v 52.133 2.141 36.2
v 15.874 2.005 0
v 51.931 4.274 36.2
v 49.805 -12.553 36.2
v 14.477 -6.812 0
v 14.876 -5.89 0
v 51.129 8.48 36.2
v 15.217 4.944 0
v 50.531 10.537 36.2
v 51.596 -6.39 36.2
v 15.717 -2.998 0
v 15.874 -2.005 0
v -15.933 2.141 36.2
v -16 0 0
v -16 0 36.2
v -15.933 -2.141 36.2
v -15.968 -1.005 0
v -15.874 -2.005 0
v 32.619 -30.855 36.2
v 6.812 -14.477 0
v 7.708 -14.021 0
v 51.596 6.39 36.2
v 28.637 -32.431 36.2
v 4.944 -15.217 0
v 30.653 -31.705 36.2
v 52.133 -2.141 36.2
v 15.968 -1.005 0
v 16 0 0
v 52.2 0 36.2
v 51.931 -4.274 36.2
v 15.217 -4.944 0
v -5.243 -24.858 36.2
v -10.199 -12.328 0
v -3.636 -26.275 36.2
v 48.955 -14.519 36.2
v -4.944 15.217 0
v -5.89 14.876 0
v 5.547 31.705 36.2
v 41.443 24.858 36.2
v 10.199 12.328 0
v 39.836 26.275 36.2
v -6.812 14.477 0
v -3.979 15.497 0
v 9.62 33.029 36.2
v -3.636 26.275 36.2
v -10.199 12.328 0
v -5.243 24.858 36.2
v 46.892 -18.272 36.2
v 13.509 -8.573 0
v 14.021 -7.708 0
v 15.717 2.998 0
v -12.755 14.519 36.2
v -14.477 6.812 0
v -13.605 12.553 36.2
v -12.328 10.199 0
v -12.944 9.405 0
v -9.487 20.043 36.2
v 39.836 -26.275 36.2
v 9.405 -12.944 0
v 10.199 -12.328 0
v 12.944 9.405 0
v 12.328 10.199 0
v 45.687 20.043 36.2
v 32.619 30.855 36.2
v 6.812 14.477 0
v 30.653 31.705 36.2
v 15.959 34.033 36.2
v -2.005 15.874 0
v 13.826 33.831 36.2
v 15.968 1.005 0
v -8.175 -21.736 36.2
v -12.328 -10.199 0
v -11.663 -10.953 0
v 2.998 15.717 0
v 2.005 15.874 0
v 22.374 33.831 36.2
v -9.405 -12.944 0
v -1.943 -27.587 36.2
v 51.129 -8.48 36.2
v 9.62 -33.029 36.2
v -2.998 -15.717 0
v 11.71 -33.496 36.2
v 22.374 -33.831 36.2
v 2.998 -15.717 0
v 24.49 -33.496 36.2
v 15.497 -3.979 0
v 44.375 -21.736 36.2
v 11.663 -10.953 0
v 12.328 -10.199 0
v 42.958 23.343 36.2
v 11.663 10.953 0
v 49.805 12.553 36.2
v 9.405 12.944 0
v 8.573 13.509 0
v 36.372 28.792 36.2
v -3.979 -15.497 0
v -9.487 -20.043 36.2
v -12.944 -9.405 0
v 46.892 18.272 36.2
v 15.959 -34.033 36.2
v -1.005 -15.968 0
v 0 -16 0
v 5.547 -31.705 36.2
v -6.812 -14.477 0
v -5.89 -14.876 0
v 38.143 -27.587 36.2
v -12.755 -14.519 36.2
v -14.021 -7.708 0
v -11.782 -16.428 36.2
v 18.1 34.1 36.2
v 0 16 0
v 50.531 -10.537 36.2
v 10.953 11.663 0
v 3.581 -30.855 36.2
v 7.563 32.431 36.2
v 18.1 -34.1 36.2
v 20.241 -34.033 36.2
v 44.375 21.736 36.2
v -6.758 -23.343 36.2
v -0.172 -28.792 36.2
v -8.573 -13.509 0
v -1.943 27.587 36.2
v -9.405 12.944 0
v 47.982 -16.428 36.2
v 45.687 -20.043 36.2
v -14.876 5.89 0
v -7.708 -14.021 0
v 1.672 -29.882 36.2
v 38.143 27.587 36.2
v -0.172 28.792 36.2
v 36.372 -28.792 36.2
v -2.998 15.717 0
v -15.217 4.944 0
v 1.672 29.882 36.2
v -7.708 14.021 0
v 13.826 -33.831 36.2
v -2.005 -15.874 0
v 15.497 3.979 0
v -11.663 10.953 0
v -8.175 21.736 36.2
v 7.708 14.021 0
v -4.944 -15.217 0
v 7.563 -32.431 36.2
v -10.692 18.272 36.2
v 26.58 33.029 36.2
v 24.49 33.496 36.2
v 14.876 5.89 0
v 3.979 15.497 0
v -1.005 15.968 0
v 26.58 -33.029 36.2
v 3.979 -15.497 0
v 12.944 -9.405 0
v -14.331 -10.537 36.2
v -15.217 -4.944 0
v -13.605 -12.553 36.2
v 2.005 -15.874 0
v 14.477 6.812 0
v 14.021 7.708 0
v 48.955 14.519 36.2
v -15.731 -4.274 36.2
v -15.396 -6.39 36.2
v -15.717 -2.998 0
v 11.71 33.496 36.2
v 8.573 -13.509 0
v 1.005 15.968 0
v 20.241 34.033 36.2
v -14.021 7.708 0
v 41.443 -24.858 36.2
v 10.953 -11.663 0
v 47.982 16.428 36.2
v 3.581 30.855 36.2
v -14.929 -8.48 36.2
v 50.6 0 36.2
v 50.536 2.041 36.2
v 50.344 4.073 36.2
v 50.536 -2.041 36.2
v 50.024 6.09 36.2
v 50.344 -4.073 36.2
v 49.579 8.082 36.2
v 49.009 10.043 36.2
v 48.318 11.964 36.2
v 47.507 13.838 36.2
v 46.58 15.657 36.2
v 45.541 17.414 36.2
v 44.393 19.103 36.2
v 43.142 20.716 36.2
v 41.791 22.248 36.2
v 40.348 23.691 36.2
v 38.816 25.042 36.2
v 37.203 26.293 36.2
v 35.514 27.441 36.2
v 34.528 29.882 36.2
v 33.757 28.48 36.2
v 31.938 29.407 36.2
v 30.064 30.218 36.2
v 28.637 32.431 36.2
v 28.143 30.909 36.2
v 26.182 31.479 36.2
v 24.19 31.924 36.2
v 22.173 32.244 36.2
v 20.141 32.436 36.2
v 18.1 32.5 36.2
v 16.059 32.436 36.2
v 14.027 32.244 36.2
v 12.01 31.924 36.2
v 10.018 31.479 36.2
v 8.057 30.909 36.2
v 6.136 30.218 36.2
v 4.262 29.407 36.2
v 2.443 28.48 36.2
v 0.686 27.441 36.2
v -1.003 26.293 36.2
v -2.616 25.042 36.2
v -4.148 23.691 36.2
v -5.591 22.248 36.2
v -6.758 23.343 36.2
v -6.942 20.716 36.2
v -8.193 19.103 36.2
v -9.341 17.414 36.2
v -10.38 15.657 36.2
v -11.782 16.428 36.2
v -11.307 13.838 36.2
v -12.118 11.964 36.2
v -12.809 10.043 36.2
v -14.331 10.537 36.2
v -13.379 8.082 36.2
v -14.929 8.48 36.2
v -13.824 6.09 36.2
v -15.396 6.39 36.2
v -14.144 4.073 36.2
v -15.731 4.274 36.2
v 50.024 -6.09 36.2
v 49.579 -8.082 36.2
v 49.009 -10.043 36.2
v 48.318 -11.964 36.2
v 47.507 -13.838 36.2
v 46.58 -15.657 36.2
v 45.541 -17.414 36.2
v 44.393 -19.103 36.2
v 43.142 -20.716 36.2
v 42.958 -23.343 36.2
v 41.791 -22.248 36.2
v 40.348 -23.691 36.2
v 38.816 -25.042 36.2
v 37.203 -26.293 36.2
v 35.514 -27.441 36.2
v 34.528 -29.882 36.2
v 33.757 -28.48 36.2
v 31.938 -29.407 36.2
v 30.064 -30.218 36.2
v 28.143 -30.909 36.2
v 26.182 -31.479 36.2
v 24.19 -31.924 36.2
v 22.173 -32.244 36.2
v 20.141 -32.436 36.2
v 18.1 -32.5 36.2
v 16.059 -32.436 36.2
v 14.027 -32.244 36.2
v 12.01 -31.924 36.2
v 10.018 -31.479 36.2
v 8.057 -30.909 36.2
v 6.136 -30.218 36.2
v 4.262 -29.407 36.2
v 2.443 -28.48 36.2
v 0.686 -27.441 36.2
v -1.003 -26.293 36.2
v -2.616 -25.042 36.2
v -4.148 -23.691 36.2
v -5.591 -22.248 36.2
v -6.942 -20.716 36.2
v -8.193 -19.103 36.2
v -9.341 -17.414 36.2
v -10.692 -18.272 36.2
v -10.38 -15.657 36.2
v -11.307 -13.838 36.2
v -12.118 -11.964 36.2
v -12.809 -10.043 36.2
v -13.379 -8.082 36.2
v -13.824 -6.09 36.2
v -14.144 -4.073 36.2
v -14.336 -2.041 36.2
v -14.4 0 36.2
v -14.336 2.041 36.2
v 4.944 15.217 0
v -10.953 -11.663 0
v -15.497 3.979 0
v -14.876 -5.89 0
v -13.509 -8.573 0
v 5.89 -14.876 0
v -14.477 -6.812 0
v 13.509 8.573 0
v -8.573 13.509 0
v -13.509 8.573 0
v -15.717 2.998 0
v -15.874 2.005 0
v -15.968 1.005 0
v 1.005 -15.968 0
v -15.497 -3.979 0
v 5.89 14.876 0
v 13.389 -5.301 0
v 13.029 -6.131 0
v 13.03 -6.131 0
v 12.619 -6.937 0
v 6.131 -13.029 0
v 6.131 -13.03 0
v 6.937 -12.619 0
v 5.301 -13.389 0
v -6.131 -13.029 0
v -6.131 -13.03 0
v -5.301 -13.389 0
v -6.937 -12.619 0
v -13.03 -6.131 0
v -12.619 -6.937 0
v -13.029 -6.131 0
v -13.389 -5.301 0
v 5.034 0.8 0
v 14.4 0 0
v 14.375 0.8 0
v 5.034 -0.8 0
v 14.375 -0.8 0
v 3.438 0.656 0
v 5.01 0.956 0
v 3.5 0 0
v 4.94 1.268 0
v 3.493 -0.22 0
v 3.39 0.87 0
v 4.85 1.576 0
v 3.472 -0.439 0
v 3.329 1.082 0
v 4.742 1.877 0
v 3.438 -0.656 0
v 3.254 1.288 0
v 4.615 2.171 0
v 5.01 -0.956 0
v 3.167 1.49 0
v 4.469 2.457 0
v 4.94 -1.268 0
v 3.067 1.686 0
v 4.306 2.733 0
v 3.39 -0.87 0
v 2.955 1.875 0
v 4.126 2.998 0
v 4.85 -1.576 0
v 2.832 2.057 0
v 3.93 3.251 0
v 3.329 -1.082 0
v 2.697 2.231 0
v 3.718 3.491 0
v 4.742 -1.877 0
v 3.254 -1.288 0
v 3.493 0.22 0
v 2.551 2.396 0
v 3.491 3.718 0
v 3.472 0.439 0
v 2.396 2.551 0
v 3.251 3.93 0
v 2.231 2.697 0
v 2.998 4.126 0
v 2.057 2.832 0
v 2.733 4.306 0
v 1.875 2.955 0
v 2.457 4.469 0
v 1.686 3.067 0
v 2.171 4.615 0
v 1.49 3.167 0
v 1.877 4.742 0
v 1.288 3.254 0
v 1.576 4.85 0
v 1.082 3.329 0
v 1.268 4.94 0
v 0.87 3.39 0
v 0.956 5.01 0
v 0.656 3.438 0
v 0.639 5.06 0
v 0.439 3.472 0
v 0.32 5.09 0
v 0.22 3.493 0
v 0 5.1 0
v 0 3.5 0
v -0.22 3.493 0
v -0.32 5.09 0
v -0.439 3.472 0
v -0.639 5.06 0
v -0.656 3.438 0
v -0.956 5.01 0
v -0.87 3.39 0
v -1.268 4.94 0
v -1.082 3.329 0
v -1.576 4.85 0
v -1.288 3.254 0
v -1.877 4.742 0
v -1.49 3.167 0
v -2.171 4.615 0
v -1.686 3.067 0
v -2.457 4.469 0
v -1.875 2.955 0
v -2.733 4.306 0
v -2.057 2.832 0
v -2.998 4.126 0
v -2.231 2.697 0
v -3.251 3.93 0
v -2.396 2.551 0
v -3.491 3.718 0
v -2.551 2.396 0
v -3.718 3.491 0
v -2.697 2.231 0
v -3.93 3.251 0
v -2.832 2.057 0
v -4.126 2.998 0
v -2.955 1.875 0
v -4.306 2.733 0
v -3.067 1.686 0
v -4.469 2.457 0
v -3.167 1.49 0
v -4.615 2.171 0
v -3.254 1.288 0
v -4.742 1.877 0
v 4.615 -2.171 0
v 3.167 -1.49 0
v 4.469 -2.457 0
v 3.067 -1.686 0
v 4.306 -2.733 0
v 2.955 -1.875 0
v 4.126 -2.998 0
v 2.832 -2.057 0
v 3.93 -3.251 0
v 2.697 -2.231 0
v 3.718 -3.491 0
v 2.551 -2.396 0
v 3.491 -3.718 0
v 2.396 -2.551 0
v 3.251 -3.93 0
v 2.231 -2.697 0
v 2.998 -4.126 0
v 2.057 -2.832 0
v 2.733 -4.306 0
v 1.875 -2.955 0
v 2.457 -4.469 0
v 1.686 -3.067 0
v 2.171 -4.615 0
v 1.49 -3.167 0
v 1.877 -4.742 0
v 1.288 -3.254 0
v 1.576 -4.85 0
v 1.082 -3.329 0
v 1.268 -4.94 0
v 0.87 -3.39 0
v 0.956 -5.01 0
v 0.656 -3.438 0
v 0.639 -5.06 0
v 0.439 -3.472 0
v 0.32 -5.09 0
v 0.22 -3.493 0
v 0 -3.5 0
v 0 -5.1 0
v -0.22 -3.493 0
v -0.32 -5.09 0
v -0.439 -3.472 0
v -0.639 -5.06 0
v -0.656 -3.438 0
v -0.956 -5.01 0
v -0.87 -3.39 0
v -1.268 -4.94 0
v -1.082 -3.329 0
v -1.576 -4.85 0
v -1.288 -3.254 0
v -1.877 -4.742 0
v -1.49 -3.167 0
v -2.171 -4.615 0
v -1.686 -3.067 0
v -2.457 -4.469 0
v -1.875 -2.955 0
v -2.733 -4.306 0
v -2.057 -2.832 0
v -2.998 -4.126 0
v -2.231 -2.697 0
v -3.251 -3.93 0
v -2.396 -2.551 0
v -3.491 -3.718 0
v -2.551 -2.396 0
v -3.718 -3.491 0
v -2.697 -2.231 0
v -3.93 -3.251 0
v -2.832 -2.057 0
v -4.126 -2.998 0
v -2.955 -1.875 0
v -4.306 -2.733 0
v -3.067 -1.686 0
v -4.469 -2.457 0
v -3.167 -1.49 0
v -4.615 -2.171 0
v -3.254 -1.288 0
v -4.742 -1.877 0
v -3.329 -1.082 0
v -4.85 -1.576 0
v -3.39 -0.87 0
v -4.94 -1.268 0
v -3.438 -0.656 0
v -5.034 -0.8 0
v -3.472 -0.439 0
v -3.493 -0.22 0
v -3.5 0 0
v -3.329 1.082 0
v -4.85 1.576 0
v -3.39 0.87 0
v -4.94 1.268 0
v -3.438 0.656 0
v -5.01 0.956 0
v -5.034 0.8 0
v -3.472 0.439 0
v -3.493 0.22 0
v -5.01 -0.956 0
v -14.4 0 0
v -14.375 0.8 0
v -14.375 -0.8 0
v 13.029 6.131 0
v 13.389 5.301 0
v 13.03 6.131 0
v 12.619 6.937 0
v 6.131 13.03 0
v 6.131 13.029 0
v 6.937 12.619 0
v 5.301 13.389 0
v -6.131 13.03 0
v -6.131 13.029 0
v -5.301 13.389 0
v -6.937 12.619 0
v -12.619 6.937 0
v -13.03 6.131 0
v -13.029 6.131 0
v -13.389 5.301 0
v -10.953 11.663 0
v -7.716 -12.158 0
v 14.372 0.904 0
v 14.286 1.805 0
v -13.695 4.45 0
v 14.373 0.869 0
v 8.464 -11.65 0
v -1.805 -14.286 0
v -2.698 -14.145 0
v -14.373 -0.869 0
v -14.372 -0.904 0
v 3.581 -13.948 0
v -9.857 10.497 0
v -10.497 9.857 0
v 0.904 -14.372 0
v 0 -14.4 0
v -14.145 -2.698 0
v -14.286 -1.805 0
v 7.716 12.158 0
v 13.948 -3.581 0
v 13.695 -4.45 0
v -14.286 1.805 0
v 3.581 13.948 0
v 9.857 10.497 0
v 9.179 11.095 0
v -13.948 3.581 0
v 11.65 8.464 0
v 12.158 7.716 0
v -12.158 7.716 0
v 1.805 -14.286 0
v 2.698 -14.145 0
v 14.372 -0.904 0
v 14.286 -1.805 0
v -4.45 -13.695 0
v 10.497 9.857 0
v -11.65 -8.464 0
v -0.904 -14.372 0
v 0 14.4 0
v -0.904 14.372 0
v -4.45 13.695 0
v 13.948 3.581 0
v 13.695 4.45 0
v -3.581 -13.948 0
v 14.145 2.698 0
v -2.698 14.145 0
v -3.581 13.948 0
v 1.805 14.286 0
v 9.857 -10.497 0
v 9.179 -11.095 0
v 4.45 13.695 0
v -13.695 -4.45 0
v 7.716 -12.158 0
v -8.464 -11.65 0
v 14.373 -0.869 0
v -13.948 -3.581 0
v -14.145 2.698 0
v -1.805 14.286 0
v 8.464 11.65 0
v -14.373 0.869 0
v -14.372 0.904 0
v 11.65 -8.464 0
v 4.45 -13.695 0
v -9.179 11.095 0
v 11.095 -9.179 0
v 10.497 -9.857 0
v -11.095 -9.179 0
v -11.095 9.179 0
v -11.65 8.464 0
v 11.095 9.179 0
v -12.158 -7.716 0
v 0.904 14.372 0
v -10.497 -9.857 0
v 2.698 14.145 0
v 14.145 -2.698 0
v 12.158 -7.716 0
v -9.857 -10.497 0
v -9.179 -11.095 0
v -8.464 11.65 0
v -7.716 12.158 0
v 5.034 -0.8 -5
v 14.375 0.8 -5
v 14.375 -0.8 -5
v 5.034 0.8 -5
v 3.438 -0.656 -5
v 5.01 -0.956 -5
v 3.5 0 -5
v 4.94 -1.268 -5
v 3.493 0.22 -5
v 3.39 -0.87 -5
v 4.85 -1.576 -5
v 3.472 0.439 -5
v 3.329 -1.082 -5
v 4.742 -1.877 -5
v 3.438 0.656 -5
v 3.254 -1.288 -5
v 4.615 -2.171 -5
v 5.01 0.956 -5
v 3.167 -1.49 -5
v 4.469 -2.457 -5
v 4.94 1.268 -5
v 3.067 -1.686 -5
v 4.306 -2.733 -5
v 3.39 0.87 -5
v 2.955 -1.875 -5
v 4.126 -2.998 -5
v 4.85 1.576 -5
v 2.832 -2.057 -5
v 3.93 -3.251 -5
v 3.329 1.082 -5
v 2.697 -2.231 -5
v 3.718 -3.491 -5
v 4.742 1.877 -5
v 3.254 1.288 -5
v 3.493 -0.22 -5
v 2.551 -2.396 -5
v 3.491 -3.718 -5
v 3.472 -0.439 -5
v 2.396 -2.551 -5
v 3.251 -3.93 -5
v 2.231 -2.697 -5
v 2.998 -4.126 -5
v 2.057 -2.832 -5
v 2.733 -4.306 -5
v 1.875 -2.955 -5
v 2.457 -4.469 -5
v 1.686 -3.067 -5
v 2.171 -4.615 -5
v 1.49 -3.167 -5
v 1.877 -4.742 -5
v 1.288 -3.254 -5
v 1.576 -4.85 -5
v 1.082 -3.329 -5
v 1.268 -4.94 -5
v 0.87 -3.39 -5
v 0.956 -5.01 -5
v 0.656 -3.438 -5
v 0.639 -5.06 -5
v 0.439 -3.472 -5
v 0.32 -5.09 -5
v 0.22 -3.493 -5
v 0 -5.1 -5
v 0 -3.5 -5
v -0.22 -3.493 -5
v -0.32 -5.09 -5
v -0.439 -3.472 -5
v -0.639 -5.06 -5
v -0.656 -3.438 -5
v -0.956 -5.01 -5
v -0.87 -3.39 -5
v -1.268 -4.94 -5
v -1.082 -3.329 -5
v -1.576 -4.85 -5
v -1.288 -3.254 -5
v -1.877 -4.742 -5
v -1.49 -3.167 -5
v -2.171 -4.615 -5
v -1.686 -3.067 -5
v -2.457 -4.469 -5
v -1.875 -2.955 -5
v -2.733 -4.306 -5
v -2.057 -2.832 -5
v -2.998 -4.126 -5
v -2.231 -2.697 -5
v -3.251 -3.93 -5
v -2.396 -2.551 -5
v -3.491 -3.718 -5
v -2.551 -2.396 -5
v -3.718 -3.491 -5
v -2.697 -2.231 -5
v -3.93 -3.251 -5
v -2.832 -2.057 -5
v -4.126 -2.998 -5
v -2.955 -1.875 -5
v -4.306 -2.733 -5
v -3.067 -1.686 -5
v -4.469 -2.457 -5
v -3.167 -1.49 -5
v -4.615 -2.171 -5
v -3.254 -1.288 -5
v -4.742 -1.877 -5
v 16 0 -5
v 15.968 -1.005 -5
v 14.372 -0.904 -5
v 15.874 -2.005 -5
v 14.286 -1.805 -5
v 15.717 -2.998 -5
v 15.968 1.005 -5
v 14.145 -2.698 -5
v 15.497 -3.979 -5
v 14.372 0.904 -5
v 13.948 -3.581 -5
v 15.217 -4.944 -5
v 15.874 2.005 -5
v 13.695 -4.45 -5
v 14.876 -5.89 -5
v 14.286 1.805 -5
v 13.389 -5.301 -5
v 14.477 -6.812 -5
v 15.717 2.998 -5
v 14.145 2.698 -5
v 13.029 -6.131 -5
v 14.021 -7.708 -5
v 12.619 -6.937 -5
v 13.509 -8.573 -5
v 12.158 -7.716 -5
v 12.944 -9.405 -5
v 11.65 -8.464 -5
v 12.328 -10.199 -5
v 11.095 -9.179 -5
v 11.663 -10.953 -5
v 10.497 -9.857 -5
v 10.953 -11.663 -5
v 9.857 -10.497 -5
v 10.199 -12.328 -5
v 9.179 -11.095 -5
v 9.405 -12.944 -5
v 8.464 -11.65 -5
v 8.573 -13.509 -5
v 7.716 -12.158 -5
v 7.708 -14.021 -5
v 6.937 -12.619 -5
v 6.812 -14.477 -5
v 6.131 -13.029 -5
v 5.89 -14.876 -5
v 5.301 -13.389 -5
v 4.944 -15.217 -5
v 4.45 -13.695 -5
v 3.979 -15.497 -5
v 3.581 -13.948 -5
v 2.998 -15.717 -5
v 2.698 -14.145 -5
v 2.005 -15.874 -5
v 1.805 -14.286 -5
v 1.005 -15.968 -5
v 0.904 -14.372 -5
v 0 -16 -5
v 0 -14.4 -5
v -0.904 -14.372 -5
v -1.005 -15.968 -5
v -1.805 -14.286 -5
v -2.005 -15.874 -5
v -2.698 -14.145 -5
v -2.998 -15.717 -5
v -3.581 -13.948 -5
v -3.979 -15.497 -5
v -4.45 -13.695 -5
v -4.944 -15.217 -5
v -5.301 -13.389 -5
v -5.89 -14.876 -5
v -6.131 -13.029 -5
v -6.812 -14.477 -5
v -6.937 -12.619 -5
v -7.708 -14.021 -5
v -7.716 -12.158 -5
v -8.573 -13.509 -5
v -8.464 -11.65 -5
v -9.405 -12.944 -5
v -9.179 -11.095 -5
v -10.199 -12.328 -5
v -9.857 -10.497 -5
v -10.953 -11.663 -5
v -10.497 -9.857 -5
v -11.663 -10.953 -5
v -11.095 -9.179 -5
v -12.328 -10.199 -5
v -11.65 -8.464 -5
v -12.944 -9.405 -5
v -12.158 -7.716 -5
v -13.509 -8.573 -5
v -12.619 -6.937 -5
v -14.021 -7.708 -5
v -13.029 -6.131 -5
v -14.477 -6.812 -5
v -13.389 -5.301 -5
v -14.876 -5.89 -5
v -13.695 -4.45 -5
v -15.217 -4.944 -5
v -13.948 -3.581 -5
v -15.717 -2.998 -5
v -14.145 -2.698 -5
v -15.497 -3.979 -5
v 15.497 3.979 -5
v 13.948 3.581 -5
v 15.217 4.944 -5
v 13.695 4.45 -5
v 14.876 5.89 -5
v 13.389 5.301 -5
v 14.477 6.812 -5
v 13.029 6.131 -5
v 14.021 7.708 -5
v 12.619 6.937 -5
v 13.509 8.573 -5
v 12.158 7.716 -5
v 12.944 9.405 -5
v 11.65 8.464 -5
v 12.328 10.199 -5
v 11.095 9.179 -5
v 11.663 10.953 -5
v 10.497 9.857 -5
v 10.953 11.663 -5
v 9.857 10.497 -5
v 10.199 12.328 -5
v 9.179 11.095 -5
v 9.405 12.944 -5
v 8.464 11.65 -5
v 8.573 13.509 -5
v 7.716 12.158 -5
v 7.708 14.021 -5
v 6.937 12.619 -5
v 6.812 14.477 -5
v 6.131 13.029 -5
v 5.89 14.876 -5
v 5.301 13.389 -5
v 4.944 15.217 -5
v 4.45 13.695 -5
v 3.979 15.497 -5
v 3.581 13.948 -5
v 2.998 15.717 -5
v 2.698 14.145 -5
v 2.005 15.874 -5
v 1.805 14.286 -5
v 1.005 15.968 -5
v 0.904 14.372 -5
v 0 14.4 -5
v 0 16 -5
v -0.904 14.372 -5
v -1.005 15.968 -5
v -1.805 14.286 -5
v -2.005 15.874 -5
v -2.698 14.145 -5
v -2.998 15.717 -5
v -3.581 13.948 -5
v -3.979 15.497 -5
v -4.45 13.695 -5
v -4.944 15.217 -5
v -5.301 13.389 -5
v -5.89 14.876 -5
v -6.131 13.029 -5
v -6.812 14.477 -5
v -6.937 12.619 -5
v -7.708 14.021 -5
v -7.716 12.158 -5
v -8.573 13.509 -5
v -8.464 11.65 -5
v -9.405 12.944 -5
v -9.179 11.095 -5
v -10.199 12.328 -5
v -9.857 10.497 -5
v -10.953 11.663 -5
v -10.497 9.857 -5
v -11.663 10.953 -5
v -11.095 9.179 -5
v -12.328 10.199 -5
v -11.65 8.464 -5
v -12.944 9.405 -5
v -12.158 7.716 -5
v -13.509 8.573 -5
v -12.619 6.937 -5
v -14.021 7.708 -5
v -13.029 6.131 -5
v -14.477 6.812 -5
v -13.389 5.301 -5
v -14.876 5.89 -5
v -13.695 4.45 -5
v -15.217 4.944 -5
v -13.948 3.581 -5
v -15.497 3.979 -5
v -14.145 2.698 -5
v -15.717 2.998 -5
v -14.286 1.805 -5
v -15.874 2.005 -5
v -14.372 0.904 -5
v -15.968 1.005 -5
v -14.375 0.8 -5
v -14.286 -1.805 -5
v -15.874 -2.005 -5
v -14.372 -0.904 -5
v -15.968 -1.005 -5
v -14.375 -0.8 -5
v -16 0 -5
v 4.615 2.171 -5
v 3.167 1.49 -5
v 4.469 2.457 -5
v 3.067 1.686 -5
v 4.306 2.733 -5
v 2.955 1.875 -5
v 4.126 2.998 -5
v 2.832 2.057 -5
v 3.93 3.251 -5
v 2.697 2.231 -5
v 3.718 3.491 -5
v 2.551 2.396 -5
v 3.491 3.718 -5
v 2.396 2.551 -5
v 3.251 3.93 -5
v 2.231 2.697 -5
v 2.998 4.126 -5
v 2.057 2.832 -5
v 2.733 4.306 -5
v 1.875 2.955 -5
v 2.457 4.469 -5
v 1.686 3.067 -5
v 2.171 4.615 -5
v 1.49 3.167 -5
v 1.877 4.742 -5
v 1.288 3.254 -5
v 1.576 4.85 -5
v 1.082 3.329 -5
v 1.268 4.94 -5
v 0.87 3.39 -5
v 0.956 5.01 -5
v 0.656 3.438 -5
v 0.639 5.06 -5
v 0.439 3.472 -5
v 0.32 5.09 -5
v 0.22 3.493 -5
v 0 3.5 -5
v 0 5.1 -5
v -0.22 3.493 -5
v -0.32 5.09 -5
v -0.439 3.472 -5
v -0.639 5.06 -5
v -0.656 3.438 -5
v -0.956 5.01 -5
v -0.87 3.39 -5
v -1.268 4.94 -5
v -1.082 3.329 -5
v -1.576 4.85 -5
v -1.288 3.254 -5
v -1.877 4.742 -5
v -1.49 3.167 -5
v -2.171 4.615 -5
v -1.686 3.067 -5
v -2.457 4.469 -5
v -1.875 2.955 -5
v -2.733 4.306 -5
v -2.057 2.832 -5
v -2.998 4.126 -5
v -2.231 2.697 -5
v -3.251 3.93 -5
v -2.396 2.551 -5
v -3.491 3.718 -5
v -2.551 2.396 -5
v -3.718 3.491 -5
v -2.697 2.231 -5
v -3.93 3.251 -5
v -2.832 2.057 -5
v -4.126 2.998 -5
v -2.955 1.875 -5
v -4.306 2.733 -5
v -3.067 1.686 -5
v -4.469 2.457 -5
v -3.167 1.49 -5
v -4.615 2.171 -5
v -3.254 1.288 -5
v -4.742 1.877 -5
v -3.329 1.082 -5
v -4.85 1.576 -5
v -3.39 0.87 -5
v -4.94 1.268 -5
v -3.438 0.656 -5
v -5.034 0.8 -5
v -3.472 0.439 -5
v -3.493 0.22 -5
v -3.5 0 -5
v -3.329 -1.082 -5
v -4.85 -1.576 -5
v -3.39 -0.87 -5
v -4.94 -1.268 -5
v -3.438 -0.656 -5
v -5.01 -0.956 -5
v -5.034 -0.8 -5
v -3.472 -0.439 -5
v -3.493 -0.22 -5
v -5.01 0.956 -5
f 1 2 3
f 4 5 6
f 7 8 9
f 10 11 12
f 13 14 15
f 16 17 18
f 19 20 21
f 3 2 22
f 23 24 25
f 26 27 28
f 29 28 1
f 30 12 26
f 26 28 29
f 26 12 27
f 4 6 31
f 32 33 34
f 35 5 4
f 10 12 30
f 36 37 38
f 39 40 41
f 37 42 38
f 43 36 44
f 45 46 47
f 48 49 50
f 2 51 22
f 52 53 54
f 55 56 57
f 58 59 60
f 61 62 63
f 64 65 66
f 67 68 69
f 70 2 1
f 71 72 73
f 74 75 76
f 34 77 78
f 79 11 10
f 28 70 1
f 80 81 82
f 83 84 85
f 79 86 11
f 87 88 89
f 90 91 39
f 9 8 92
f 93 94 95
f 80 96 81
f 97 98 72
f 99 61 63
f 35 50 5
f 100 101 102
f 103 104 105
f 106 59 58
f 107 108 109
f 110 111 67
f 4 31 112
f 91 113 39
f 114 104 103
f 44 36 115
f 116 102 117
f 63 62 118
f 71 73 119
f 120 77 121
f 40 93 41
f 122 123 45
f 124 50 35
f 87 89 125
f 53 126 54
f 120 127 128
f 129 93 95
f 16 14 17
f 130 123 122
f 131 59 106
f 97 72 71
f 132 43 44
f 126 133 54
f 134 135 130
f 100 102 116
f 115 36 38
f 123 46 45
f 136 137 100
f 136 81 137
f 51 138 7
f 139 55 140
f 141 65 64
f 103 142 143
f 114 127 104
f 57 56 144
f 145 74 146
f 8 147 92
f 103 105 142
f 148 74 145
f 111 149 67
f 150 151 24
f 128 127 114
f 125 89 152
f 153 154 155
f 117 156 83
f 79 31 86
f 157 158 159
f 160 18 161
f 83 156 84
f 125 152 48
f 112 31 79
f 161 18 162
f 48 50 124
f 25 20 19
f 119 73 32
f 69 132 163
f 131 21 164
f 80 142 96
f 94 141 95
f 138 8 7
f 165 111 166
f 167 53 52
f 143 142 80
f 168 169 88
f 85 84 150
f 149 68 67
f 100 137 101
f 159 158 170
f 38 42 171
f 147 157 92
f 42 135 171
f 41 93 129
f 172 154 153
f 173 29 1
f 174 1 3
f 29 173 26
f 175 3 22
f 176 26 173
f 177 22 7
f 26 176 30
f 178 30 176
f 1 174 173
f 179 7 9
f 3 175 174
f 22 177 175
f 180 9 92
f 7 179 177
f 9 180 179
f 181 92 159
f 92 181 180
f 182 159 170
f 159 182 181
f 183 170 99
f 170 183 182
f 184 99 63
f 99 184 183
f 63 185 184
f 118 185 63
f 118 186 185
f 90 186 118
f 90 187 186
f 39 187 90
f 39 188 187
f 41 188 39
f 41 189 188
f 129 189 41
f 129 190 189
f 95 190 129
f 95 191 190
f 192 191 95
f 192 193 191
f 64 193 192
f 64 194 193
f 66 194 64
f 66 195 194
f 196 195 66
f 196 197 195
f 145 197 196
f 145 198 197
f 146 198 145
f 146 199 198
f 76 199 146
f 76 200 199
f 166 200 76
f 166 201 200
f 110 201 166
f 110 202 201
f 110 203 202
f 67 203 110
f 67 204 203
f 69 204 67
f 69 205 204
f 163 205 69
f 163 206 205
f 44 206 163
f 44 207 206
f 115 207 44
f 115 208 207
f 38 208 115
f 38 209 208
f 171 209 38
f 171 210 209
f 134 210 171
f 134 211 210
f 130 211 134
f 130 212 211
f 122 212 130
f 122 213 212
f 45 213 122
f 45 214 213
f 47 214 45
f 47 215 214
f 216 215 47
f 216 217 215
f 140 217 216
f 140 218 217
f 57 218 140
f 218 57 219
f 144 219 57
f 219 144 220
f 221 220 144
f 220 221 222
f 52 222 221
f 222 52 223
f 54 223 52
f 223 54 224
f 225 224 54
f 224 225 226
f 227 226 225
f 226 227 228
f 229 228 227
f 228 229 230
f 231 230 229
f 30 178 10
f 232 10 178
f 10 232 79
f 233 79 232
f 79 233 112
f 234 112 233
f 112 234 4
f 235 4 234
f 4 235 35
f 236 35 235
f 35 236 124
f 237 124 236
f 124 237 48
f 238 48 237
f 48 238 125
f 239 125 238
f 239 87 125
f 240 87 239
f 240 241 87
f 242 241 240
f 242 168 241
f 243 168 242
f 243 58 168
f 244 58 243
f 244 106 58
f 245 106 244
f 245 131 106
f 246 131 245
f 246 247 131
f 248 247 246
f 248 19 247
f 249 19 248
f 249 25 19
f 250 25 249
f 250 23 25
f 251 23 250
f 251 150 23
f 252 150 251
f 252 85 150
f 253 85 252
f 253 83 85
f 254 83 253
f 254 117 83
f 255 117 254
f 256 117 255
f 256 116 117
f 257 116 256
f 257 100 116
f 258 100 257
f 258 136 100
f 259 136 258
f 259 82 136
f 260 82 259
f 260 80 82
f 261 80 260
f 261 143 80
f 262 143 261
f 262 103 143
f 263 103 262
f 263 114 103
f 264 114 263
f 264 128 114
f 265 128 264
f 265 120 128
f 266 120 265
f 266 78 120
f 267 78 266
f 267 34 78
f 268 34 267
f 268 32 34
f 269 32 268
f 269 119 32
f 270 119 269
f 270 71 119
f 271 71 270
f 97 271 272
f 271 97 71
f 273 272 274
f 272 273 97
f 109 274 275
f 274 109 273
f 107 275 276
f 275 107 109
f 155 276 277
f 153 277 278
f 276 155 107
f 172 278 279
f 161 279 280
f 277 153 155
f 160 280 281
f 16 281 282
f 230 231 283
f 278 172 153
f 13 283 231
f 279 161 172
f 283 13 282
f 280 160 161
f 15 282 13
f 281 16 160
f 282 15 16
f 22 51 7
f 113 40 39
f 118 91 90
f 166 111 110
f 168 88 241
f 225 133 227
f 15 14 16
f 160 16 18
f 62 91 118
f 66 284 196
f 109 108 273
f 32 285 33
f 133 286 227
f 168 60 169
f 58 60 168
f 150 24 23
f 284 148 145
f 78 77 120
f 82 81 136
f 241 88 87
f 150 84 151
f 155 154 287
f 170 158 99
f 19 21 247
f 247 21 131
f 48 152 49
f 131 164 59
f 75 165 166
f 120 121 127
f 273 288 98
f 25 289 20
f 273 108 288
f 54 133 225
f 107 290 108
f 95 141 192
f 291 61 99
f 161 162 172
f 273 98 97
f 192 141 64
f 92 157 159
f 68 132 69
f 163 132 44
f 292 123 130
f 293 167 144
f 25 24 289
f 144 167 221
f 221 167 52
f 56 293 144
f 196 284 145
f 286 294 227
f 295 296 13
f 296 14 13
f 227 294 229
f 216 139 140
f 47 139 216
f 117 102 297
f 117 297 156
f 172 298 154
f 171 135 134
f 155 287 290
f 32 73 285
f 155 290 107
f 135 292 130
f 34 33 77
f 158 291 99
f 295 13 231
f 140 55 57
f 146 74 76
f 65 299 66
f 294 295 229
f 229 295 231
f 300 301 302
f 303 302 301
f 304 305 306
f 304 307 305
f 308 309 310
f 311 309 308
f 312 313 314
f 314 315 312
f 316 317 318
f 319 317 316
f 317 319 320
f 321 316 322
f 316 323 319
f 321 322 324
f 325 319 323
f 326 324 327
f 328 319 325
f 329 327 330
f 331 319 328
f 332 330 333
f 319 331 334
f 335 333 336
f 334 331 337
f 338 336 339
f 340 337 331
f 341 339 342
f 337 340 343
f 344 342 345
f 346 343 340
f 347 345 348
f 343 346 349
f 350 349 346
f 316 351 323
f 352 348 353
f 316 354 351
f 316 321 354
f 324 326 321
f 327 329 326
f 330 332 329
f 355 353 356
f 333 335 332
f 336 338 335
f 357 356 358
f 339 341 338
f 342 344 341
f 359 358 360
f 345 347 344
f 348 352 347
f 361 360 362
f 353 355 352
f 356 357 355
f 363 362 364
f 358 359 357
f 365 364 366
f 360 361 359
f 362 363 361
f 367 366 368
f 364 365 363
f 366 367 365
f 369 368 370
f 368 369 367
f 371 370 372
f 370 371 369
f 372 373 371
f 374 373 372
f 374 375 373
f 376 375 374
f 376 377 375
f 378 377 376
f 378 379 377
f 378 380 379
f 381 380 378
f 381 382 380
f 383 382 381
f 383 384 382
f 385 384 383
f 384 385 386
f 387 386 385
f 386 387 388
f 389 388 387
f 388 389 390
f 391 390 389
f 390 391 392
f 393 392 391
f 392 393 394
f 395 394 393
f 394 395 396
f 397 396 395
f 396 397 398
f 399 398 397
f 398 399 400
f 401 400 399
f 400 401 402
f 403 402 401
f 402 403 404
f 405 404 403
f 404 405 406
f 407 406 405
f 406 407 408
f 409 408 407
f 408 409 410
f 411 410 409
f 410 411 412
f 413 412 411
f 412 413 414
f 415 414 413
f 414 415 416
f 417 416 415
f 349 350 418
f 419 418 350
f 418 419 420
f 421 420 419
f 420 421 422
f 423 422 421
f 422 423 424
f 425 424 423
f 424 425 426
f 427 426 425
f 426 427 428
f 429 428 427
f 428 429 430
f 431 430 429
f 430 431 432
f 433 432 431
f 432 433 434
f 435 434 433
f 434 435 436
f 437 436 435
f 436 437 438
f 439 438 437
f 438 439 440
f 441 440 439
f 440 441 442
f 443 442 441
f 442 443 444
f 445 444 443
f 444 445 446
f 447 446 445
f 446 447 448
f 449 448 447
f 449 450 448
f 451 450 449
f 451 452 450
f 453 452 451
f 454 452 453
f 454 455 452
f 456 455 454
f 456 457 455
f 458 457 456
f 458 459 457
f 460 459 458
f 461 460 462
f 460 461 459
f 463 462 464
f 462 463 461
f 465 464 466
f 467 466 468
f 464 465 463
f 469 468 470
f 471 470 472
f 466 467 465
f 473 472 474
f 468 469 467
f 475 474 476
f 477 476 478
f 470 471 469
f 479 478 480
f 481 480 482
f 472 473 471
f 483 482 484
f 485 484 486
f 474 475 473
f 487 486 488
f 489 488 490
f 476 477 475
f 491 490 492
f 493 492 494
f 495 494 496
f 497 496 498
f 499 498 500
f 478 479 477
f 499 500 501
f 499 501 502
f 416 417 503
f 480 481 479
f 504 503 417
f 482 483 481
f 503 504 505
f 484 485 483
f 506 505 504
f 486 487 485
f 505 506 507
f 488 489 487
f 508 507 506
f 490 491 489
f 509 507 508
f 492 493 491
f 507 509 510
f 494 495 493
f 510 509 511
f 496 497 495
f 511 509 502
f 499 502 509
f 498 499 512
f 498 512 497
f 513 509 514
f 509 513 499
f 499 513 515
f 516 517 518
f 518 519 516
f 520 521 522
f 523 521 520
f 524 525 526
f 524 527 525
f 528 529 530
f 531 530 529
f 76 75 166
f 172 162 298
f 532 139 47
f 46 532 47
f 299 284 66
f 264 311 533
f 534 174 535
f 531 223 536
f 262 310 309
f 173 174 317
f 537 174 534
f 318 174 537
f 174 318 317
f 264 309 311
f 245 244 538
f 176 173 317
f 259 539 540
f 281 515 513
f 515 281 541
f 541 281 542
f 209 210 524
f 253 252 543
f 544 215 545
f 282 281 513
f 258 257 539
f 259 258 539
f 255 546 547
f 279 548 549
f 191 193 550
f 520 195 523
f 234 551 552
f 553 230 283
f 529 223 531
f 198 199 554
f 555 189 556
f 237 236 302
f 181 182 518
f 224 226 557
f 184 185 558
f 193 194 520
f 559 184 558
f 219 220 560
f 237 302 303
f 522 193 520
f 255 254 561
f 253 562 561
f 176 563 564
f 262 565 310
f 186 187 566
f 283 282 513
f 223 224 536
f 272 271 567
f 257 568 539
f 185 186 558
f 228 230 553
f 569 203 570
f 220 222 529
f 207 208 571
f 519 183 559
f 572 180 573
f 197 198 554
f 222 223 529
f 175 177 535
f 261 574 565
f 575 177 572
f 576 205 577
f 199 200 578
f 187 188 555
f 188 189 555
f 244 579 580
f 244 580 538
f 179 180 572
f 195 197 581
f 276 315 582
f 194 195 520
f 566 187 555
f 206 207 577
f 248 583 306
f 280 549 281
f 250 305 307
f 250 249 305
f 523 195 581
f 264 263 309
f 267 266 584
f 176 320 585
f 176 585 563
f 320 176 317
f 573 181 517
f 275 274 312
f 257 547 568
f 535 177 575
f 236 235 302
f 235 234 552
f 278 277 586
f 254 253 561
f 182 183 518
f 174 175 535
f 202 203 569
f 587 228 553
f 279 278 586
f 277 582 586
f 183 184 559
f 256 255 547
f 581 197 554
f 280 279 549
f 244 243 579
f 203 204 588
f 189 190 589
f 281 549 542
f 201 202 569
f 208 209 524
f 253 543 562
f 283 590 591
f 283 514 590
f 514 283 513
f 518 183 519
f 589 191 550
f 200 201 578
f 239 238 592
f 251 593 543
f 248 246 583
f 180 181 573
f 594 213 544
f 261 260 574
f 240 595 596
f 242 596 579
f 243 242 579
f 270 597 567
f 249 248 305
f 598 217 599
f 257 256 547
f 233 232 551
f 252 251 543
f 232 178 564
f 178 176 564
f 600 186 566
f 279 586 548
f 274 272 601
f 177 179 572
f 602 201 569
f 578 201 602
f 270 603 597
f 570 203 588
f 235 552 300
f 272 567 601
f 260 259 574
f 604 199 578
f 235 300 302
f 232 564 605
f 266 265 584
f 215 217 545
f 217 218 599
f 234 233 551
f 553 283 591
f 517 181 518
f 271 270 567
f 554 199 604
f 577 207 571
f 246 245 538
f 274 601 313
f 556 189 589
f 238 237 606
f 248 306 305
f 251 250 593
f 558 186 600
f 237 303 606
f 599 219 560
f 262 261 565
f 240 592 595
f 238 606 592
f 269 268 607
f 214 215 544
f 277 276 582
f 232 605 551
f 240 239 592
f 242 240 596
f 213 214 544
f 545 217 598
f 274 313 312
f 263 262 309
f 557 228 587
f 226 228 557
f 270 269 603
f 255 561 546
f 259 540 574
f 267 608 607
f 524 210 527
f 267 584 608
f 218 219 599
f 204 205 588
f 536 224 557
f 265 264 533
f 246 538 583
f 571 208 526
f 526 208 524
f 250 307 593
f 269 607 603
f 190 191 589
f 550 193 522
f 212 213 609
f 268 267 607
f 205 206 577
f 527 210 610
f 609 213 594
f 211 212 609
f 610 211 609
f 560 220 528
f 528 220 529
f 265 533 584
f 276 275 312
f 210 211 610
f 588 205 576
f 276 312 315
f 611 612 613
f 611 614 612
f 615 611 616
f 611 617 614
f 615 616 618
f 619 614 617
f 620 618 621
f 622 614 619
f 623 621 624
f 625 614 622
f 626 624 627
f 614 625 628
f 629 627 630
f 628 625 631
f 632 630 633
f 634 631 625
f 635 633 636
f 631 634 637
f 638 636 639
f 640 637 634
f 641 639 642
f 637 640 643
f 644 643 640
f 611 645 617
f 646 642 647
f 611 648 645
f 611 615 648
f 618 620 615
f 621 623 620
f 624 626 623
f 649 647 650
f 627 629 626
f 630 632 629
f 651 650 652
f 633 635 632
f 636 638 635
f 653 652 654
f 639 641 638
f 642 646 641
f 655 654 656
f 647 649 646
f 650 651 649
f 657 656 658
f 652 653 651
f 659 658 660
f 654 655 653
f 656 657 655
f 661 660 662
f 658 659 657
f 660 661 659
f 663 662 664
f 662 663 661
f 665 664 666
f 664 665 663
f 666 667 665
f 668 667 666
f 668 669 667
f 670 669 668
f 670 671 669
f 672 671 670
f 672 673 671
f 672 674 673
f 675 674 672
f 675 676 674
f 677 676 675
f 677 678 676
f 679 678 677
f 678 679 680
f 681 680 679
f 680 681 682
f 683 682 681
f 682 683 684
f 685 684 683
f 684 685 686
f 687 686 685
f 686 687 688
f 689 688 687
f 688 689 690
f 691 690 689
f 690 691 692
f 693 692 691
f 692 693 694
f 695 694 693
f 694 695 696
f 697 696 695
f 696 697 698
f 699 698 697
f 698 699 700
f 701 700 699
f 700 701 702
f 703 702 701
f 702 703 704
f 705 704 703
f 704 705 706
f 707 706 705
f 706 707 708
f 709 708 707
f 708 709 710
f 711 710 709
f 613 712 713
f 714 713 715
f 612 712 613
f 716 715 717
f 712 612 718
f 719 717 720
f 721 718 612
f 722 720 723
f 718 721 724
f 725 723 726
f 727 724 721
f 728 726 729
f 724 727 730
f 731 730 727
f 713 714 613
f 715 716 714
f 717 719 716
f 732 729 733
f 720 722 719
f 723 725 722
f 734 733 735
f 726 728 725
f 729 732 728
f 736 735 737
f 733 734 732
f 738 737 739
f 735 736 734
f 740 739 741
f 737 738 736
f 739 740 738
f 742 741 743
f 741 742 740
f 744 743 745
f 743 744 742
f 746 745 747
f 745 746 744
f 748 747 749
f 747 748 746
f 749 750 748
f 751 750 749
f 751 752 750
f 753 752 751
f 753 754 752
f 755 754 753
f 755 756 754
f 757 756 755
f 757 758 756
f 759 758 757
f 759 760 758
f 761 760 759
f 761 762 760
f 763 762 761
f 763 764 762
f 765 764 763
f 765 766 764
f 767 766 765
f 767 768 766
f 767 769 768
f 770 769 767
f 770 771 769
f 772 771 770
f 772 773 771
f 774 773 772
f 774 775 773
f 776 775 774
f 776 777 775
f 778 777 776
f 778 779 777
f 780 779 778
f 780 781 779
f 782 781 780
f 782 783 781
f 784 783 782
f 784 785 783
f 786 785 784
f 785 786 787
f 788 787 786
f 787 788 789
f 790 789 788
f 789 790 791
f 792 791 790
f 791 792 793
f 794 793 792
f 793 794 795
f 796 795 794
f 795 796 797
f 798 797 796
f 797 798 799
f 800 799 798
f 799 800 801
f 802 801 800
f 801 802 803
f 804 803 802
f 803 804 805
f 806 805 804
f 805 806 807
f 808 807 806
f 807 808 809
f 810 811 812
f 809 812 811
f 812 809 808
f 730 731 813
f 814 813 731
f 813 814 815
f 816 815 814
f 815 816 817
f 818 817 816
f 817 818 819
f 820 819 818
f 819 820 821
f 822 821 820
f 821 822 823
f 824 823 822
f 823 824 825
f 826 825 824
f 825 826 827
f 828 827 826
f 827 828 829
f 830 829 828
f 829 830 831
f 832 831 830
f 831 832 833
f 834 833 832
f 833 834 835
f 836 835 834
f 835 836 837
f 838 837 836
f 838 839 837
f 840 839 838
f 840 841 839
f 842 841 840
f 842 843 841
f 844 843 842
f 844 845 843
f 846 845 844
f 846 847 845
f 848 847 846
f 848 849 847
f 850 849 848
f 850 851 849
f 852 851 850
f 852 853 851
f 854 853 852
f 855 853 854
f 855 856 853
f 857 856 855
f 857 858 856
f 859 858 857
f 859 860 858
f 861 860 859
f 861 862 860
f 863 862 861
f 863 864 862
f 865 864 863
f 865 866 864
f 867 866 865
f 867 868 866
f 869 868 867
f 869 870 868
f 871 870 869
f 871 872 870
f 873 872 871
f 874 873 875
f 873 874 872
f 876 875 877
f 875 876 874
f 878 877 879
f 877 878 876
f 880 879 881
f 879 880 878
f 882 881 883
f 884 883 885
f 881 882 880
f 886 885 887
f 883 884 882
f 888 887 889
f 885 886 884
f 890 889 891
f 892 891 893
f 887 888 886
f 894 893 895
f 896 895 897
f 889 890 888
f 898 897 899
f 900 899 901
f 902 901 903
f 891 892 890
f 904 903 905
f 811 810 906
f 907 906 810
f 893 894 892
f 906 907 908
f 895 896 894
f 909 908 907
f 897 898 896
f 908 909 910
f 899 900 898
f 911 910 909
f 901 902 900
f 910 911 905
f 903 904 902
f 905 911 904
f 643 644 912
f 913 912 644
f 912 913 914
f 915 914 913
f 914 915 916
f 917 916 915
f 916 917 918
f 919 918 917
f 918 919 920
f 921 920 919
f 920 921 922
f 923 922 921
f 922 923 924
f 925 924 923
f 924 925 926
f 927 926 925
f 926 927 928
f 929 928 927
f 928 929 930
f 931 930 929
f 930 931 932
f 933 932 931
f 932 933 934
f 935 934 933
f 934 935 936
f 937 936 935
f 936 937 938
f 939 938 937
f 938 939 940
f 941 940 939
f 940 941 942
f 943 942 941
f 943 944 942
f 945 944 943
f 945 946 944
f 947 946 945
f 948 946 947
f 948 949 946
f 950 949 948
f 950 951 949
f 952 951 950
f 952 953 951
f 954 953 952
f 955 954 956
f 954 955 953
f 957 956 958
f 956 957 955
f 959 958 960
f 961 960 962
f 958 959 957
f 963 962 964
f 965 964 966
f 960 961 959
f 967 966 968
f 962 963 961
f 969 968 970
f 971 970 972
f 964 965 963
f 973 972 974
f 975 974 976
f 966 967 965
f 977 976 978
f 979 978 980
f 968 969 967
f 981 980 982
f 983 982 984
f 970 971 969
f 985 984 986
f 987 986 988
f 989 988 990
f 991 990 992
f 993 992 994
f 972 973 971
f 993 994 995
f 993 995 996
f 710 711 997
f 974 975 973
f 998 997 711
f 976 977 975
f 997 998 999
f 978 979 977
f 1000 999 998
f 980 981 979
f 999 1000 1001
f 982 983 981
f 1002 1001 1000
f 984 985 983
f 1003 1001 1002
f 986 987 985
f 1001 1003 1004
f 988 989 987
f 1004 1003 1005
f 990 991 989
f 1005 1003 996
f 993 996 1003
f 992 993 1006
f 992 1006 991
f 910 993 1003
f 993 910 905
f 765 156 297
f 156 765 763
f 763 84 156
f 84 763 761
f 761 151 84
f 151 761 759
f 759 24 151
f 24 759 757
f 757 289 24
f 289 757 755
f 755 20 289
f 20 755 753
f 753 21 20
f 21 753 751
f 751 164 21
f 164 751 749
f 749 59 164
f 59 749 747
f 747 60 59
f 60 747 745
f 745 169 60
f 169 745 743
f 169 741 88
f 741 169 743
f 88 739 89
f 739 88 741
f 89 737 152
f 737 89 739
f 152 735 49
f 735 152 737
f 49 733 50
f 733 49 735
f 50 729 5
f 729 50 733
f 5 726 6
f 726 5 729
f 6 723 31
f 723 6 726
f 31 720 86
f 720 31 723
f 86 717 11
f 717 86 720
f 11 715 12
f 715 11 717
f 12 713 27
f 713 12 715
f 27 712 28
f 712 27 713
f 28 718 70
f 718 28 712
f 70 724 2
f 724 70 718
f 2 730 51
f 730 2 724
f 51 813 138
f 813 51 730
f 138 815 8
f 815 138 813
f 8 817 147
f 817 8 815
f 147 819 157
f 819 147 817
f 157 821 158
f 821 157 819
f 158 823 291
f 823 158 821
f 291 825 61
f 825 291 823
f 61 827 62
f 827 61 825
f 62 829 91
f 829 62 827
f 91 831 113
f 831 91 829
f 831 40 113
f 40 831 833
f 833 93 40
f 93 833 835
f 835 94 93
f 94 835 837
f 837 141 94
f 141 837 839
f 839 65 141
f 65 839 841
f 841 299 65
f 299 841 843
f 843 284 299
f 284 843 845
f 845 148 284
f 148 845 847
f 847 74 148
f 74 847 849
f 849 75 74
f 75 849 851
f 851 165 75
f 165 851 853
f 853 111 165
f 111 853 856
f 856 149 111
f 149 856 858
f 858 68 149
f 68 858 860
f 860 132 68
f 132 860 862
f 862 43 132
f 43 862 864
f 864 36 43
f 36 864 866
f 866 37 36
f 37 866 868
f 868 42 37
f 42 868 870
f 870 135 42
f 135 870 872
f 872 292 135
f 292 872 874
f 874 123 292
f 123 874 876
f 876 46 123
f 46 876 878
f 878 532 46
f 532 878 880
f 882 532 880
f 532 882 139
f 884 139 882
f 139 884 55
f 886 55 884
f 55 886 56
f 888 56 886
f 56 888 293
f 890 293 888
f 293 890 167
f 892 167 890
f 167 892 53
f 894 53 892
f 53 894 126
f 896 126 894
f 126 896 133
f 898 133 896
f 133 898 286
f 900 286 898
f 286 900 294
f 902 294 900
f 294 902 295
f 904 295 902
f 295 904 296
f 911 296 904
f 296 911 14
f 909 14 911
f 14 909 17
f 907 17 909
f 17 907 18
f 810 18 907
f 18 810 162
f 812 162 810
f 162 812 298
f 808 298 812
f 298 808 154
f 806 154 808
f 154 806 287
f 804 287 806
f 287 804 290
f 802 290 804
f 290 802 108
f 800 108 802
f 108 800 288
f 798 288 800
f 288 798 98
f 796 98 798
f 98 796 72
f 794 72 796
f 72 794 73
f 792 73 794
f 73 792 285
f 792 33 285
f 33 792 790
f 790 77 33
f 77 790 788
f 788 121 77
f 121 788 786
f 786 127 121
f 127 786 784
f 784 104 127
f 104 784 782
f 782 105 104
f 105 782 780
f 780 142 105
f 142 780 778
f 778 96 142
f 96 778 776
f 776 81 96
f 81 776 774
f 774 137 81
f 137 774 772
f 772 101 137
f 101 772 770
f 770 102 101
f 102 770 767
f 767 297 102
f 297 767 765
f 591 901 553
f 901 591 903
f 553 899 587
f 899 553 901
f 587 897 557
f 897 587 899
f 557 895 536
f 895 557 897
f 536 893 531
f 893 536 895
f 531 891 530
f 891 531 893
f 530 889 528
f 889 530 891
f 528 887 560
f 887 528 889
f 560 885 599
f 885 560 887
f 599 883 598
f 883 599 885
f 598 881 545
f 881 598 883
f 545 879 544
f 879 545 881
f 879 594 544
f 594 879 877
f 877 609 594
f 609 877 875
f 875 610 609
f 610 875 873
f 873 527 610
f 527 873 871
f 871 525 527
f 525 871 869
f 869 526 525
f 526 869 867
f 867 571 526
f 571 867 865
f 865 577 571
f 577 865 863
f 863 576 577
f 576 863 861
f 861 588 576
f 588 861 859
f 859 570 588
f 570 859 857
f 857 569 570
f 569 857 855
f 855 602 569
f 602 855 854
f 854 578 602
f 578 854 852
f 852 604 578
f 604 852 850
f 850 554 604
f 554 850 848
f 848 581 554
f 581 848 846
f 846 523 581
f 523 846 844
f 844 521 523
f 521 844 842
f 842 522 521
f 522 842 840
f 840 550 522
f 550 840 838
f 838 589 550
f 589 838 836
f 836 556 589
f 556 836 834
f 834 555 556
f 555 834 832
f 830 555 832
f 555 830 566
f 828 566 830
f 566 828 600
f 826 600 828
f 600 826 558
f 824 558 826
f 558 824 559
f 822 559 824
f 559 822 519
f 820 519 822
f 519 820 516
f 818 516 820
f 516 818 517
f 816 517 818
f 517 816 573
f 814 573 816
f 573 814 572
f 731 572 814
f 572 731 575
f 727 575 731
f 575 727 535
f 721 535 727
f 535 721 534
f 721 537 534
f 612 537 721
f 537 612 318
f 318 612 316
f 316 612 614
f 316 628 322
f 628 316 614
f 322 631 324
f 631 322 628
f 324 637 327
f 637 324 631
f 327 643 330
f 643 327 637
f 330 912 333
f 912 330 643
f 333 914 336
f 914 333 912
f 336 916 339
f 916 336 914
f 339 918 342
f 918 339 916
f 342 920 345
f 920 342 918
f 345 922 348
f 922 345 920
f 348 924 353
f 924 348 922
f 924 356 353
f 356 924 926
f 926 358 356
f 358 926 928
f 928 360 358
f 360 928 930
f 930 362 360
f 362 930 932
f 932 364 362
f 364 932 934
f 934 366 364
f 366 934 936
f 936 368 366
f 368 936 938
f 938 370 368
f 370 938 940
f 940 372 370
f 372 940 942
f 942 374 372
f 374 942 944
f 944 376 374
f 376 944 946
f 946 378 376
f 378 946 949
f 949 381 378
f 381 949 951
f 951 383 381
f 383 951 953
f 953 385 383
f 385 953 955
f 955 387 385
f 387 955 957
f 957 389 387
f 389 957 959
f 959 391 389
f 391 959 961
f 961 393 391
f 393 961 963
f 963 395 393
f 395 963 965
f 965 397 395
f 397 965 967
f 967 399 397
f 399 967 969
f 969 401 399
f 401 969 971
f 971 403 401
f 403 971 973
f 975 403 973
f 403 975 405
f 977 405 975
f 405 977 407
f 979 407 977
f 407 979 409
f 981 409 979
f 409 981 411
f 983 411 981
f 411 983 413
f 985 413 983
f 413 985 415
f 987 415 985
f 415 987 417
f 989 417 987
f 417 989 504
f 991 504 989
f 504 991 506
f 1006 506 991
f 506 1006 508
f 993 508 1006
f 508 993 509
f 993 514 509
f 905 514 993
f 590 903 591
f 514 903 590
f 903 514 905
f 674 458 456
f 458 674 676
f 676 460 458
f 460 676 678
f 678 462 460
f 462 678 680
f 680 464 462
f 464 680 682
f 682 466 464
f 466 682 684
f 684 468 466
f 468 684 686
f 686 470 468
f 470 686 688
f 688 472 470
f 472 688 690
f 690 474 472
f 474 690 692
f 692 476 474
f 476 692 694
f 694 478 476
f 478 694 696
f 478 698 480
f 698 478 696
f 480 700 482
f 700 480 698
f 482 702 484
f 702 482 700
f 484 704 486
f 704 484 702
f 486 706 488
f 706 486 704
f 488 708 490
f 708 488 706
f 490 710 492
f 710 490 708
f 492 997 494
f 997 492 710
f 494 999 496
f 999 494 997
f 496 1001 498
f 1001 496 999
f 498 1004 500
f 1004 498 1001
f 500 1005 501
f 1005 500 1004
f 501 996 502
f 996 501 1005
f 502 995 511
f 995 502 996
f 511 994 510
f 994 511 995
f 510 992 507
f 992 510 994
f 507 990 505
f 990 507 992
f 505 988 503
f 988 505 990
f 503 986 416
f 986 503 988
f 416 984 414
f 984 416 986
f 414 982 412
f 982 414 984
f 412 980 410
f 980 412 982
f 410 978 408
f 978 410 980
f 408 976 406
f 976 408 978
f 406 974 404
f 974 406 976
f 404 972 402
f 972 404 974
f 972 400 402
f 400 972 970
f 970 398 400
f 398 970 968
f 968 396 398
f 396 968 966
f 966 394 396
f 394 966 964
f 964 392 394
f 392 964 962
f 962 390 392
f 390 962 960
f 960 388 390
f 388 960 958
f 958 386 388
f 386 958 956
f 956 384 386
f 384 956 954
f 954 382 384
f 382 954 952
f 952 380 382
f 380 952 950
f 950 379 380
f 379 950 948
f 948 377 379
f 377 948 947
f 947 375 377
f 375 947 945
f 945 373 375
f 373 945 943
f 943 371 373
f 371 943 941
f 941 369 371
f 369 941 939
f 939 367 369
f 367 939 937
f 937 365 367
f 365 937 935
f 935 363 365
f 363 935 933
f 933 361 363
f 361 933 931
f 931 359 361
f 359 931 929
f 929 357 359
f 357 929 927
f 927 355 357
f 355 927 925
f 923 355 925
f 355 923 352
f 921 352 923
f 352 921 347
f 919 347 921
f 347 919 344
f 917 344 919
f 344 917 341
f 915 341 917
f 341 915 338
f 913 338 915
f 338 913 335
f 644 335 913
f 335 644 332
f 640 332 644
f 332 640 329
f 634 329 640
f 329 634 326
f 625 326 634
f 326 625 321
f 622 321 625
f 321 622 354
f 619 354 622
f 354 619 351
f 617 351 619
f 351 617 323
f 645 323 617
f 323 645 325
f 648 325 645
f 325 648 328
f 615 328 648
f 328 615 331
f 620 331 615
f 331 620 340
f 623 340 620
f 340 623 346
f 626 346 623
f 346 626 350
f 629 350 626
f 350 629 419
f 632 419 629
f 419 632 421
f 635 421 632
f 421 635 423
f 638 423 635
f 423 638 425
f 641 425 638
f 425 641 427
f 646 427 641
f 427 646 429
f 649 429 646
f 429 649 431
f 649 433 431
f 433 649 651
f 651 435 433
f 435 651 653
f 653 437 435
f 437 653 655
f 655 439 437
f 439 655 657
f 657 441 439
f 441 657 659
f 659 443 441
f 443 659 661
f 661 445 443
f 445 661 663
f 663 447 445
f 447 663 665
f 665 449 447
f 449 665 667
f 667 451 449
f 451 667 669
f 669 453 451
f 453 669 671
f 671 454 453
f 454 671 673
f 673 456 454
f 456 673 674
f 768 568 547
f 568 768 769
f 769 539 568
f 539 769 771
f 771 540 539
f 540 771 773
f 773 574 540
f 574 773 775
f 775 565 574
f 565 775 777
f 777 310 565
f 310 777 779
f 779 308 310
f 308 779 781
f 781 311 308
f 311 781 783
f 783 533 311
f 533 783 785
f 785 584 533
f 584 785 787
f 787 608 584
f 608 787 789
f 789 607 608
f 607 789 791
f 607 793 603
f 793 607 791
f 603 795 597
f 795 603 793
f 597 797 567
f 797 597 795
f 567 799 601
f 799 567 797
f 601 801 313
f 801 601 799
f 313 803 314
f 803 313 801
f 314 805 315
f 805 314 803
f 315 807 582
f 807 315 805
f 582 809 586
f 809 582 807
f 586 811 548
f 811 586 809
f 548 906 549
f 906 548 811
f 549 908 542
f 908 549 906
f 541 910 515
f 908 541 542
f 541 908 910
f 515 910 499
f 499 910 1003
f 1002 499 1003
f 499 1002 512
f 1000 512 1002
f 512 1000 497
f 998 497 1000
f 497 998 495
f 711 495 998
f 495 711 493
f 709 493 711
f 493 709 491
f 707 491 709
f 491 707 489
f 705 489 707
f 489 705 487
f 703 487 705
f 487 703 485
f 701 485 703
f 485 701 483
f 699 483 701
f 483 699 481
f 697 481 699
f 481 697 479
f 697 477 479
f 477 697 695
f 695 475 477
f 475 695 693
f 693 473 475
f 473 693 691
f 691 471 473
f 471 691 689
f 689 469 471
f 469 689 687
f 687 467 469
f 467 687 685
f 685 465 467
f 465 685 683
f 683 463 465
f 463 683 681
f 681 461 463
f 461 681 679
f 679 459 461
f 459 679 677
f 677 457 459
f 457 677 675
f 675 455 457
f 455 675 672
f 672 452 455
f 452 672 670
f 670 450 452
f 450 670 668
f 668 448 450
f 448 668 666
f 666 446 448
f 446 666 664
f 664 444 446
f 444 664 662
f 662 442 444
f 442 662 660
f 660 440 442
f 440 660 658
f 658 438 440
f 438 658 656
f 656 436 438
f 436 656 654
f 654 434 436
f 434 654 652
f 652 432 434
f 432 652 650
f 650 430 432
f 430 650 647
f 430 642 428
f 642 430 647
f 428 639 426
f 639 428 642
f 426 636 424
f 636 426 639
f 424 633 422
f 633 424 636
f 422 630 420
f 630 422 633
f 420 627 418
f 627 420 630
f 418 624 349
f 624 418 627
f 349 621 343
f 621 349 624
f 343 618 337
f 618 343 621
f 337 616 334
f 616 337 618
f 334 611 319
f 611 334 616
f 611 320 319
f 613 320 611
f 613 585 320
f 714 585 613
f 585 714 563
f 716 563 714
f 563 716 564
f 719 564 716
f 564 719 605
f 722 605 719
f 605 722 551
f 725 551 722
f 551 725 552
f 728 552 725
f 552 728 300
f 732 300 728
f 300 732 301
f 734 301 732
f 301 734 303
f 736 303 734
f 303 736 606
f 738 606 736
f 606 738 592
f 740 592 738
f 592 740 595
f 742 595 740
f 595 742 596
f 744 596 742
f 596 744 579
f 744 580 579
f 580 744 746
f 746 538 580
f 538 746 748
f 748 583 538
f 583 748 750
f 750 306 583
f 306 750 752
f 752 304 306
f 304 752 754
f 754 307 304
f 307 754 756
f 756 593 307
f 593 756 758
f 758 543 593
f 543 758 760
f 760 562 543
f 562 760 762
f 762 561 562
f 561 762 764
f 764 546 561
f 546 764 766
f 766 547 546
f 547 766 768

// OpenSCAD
/* [Global] */

//resolution
$fn=100;

//wall thickness (multiple of extrusion width, add 0.01 for small values to prevent slicing errors)
wall_t=1.6;

//tolerance of holes
tolerance=1; // [0:0.1:3]


/* [Funnel] */

//diameter of grinder opening
grinder_d_without_tolerance=33;
grinder_d=grinder_d_without_tolerance-tolerance;

//height of vertical grinder opening
grinder_h=5;

//diameter of grinder screw
screw_d_without_tolerance=6;
screw_d=screw_d_without_tolerance+tolerance;

//interior diameter of top of funnel
funnel_d_interior=65;
funnel_d=funnel_d_interior+(wall_t*2);

//funnel_angle from horizontal (determines height)
funnel_angle=45; // [15:75]

//height of funnel
funnel_h=(funnel_d-grinder_d)/tan(90-funnel_angle);


module oblong_cone(d, height, scale) {
   translate([-d/2,0,0])
      linear_extrude(funnel_h, scale=scale)
         translate([d/2,0,0])
            circle(d/2);
}

module angled_funnel() {
   difference() {
      oblong_cone(grinder_d, funnel_h, funnel_d/grinder_d);
      oblong_cone(grinder_d-(wall_t*2), funnel_h, (funnel_d-(wall_t*2))/(grinder_d-(wall_t*2)));
   }
}

module grinder_base() {
   translate([0,0,-grinder_h]) linear_extrude(grinder_h) {
      difference() {
         circle(d=grinder_d);
         circle(d=grinder_d-(wall_t*2));
      }
      difference() {
         union() {
            square([grinder_d-wall_t, wall_t], center=true);
            circle(d=screw_d+(wall_t*2));
         }
         circle(d=screw_d);
      }
   }
}

grinder_base();
angled_funnel();
